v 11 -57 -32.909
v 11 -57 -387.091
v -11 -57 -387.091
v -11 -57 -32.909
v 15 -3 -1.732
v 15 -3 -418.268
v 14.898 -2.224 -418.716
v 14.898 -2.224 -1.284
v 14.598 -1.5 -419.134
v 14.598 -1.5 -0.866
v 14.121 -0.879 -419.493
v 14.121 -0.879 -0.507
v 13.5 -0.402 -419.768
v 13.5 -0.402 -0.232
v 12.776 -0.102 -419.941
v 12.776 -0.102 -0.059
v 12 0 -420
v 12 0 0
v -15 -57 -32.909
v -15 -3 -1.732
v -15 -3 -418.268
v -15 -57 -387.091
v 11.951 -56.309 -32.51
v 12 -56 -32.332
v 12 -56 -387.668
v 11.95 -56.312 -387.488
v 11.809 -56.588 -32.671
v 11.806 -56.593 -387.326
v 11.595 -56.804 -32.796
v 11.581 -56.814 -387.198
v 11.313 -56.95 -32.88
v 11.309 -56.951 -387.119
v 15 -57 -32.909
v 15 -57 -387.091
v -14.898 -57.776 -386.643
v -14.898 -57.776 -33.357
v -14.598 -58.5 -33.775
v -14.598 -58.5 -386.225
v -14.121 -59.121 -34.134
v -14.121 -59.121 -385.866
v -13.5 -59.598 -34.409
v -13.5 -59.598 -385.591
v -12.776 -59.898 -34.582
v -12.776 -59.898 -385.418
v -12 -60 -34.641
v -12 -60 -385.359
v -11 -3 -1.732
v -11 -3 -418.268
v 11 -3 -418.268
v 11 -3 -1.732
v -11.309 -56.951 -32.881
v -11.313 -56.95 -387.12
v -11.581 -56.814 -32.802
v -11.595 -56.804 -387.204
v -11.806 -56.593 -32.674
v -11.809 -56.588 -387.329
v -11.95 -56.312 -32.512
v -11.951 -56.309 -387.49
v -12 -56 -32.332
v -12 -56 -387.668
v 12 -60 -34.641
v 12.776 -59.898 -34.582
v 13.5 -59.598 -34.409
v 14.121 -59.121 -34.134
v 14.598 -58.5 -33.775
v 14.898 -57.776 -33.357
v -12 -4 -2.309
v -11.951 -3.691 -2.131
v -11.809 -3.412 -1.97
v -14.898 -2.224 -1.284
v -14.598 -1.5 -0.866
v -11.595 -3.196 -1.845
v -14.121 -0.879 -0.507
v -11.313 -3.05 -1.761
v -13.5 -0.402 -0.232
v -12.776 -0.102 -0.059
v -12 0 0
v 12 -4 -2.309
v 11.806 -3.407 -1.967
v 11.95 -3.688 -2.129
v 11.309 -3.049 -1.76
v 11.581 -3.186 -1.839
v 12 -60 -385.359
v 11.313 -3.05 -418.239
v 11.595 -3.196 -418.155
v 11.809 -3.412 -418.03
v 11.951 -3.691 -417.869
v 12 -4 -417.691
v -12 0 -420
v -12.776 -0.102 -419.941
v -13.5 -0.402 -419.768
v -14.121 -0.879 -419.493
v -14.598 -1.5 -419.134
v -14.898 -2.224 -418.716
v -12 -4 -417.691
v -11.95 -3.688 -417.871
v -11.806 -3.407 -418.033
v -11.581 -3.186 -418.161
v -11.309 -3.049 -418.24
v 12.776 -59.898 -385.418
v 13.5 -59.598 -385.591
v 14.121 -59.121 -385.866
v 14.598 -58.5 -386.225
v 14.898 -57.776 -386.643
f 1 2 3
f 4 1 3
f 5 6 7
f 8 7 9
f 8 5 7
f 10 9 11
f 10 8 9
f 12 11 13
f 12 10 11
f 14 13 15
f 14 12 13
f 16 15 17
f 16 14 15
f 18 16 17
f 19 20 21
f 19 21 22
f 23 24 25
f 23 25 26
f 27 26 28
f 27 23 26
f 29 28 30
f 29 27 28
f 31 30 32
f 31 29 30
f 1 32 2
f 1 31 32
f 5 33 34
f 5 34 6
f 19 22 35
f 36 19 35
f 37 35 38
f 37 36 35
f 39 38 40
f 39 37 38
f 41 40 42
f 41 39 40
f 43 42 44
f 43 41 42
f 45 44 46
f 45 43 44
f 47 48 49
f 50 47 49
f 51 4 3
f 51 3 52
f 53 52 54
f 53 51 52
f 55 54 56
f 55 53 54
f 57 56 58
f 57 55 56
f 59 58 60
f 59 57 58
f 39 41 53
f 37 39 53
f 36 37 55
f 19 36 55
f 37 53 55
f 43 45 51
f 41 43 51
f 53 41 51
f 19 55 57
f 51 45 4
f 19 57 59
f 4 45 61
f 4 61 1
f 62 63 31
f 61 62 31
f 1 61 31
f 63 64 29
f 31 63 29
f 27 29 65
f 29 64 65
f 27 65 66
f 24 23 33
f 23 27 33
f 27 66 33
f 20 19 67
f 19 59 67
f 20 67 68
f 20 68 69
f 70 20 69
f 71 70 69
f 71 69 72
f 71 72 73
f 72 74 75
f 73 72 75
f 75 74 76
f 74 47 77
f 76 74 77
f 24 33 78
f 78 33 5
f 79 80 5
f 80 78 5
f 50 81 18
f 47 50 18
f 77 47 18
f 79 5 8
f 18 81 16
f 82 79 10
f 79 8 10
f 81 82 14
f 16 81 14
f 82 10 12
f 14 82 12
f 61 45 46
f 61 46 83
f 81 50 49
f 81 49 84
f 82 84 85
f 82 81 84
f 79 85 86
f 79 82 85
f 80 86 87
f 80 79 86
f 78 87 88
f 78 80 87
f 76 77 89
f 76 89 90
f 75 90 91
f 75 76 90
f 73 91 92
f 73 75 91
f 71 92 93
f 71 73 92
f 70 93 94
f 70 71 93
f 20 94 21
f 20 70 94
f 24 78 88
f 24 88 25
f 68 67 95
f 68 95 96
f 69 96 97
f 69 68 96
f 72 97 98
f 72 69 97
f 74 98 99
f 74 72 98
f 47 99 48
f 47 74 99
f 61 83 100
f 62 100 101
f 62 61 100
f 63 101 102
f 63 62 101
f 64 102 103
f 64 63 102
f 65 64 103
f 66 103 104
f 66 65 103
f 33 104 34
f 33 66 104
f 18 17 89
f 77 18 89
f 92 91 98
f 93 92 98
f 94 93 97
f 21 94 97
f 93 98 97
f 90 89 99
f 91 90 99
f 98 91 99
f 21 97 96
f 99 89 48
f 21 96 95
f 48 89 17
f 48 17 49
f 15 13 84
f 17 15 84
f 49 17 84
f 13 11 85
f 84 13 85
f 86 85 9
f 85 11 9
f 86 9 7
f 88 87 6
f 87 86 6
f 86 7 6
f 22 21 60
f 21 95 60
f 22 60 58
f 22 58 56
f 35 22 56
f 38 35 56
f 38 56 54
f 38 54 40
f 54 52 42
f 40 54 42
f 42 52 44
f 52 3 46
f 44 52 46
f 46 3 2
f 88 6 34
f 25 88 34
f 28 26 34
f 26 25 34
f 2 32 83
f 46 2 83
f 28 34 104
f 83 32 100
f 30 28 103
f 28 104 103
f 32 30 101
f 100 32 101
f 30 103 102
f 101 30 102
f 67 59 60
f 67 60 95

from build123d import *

# Parameters (mm, degrees)
DODANIE_WYCI_GNI_CIE1_DEPTH = 420
WYTNIJ_WYCI_GNI_CIE1_REACH  = 427.323


with BuildPart() as part:
    # Szkic1 → Dodanie-wyciągnięcie1 (new body)
    with BuildSketch(Plane.XY):
        with BuildLine():
            Line((-12, -60), (12, -60))
            ThreePointArc((12, -60), (14.121320344, -59.121320344), (15, -57))
            Line((15, -57), (15, -3))
            ThreePointArc((15, -3), (14.121320344, -0.878679656), (12, 0))
            Line((12, 0), (-12, 0))
            ThreePointArc((-12, 0), (-14.121320344, -0.878679656), (-15, -3))
            Line((-15, -3), (-15, -57))
            ThreePointArc((-15, -57), (-14.121320344, -59.121320344), (-12, -60))
        make_face()
        with BuildLine():
            Line((-11, -3), (11, -3))
            ThreePointArc((11, -3), (11.707106781, -3.292893219), (12, -4))
            Line((12, -4), (12, -56))
            ThreePointArc((12, -56), (11.707106781, -56.707106781), (11, -57))
            Line((11, -57), (-11, -57))
            ThreePointArc((-11, -57), (-11.707106781, -56.707106781), (-12, -56))
            Line((-12, -56), (-12, -4))
            ThreePointArc((-12, -4), (-11.707106781, -3.292893219), (-11, -3))
        make_face(mode=Mode.SUBTRACT)
    extrude(amount=-DODANIE_WYCI_GNI_CIE1_DEPTH)

    # Wytnij-wyciągnięcie1: up to this face of the body (flat: up to its plane)
    wytnij_wyci_gni_cie1_end = Plane(part.part.faces().sort_by_distance((-15, -30, -210))[0])
    # Szkic2 → Wytnij-wyciągnięcie1 (cut, up to the picked face)
    with BuildSketch(Plane(origin=(15, 0, 0), x_dir=(0, 0, -1), z_dir=(1, 0, 0)), mode=Mode.PRIVATE) as wytnij_wyci_gni_cie1_sk1:
        Polygon((0, -60), (34.641016151, -60), (0, 0), align=None)
    wytnij_wyci_gni_cie1_tool1 = split(extrude(wytnij_wyci_gni_cie1_sk1.sketch, amount=-WYTNIJ_WYCI_GNI_CIE1_REACH, mode=Mode.PRIVATE), bisect_by=wytnij_wyci_gni_cie1_end, keep=Keep.BOTH, mode=Mode.PRIVATE)
    # Szkic2 → Wytnij-wyciągnięcie1 (cut, up to the picked face)
    with BuildSketch(Plane(origin=(15, 0, 0), x_dir=(0, 0, -1), z_dir=(1, 0, 0)), mode=Mode.PRIVATE) as wytnij_wyci_gni_cie1_sk2:
        Polygon((420, -60), (420, 0), (385.358983849, -60), align=None)
    wytnij_wyci_gni_cie1_tool2 = split(extrude(wytnij_wyci_gni_cie1_sk2.sketch, amount=-WYTNIJ_WYCI_GNI_CIE1_REACH, mode=Mode.PRIVATE), bisect_by=wytnij_wyci_gni_cie1_end, keep=Keep.BOTH, mode=Mode.PRIVATE)
    add(wytnij_wyci_gni_cie1_tool1.solids().sort_by(Axis((15, -40, -11.547005), (-1, 0, 0)))[0], mode=Mode.SUBTRACT)
    add(wytnij_wyci_gni_cie1_tool2.solids().sort_by(Axis((15, -40, -408.452995), (-1, 0, 0)))[0], mode=Mode.SUBTRACT)


solid = part.part
